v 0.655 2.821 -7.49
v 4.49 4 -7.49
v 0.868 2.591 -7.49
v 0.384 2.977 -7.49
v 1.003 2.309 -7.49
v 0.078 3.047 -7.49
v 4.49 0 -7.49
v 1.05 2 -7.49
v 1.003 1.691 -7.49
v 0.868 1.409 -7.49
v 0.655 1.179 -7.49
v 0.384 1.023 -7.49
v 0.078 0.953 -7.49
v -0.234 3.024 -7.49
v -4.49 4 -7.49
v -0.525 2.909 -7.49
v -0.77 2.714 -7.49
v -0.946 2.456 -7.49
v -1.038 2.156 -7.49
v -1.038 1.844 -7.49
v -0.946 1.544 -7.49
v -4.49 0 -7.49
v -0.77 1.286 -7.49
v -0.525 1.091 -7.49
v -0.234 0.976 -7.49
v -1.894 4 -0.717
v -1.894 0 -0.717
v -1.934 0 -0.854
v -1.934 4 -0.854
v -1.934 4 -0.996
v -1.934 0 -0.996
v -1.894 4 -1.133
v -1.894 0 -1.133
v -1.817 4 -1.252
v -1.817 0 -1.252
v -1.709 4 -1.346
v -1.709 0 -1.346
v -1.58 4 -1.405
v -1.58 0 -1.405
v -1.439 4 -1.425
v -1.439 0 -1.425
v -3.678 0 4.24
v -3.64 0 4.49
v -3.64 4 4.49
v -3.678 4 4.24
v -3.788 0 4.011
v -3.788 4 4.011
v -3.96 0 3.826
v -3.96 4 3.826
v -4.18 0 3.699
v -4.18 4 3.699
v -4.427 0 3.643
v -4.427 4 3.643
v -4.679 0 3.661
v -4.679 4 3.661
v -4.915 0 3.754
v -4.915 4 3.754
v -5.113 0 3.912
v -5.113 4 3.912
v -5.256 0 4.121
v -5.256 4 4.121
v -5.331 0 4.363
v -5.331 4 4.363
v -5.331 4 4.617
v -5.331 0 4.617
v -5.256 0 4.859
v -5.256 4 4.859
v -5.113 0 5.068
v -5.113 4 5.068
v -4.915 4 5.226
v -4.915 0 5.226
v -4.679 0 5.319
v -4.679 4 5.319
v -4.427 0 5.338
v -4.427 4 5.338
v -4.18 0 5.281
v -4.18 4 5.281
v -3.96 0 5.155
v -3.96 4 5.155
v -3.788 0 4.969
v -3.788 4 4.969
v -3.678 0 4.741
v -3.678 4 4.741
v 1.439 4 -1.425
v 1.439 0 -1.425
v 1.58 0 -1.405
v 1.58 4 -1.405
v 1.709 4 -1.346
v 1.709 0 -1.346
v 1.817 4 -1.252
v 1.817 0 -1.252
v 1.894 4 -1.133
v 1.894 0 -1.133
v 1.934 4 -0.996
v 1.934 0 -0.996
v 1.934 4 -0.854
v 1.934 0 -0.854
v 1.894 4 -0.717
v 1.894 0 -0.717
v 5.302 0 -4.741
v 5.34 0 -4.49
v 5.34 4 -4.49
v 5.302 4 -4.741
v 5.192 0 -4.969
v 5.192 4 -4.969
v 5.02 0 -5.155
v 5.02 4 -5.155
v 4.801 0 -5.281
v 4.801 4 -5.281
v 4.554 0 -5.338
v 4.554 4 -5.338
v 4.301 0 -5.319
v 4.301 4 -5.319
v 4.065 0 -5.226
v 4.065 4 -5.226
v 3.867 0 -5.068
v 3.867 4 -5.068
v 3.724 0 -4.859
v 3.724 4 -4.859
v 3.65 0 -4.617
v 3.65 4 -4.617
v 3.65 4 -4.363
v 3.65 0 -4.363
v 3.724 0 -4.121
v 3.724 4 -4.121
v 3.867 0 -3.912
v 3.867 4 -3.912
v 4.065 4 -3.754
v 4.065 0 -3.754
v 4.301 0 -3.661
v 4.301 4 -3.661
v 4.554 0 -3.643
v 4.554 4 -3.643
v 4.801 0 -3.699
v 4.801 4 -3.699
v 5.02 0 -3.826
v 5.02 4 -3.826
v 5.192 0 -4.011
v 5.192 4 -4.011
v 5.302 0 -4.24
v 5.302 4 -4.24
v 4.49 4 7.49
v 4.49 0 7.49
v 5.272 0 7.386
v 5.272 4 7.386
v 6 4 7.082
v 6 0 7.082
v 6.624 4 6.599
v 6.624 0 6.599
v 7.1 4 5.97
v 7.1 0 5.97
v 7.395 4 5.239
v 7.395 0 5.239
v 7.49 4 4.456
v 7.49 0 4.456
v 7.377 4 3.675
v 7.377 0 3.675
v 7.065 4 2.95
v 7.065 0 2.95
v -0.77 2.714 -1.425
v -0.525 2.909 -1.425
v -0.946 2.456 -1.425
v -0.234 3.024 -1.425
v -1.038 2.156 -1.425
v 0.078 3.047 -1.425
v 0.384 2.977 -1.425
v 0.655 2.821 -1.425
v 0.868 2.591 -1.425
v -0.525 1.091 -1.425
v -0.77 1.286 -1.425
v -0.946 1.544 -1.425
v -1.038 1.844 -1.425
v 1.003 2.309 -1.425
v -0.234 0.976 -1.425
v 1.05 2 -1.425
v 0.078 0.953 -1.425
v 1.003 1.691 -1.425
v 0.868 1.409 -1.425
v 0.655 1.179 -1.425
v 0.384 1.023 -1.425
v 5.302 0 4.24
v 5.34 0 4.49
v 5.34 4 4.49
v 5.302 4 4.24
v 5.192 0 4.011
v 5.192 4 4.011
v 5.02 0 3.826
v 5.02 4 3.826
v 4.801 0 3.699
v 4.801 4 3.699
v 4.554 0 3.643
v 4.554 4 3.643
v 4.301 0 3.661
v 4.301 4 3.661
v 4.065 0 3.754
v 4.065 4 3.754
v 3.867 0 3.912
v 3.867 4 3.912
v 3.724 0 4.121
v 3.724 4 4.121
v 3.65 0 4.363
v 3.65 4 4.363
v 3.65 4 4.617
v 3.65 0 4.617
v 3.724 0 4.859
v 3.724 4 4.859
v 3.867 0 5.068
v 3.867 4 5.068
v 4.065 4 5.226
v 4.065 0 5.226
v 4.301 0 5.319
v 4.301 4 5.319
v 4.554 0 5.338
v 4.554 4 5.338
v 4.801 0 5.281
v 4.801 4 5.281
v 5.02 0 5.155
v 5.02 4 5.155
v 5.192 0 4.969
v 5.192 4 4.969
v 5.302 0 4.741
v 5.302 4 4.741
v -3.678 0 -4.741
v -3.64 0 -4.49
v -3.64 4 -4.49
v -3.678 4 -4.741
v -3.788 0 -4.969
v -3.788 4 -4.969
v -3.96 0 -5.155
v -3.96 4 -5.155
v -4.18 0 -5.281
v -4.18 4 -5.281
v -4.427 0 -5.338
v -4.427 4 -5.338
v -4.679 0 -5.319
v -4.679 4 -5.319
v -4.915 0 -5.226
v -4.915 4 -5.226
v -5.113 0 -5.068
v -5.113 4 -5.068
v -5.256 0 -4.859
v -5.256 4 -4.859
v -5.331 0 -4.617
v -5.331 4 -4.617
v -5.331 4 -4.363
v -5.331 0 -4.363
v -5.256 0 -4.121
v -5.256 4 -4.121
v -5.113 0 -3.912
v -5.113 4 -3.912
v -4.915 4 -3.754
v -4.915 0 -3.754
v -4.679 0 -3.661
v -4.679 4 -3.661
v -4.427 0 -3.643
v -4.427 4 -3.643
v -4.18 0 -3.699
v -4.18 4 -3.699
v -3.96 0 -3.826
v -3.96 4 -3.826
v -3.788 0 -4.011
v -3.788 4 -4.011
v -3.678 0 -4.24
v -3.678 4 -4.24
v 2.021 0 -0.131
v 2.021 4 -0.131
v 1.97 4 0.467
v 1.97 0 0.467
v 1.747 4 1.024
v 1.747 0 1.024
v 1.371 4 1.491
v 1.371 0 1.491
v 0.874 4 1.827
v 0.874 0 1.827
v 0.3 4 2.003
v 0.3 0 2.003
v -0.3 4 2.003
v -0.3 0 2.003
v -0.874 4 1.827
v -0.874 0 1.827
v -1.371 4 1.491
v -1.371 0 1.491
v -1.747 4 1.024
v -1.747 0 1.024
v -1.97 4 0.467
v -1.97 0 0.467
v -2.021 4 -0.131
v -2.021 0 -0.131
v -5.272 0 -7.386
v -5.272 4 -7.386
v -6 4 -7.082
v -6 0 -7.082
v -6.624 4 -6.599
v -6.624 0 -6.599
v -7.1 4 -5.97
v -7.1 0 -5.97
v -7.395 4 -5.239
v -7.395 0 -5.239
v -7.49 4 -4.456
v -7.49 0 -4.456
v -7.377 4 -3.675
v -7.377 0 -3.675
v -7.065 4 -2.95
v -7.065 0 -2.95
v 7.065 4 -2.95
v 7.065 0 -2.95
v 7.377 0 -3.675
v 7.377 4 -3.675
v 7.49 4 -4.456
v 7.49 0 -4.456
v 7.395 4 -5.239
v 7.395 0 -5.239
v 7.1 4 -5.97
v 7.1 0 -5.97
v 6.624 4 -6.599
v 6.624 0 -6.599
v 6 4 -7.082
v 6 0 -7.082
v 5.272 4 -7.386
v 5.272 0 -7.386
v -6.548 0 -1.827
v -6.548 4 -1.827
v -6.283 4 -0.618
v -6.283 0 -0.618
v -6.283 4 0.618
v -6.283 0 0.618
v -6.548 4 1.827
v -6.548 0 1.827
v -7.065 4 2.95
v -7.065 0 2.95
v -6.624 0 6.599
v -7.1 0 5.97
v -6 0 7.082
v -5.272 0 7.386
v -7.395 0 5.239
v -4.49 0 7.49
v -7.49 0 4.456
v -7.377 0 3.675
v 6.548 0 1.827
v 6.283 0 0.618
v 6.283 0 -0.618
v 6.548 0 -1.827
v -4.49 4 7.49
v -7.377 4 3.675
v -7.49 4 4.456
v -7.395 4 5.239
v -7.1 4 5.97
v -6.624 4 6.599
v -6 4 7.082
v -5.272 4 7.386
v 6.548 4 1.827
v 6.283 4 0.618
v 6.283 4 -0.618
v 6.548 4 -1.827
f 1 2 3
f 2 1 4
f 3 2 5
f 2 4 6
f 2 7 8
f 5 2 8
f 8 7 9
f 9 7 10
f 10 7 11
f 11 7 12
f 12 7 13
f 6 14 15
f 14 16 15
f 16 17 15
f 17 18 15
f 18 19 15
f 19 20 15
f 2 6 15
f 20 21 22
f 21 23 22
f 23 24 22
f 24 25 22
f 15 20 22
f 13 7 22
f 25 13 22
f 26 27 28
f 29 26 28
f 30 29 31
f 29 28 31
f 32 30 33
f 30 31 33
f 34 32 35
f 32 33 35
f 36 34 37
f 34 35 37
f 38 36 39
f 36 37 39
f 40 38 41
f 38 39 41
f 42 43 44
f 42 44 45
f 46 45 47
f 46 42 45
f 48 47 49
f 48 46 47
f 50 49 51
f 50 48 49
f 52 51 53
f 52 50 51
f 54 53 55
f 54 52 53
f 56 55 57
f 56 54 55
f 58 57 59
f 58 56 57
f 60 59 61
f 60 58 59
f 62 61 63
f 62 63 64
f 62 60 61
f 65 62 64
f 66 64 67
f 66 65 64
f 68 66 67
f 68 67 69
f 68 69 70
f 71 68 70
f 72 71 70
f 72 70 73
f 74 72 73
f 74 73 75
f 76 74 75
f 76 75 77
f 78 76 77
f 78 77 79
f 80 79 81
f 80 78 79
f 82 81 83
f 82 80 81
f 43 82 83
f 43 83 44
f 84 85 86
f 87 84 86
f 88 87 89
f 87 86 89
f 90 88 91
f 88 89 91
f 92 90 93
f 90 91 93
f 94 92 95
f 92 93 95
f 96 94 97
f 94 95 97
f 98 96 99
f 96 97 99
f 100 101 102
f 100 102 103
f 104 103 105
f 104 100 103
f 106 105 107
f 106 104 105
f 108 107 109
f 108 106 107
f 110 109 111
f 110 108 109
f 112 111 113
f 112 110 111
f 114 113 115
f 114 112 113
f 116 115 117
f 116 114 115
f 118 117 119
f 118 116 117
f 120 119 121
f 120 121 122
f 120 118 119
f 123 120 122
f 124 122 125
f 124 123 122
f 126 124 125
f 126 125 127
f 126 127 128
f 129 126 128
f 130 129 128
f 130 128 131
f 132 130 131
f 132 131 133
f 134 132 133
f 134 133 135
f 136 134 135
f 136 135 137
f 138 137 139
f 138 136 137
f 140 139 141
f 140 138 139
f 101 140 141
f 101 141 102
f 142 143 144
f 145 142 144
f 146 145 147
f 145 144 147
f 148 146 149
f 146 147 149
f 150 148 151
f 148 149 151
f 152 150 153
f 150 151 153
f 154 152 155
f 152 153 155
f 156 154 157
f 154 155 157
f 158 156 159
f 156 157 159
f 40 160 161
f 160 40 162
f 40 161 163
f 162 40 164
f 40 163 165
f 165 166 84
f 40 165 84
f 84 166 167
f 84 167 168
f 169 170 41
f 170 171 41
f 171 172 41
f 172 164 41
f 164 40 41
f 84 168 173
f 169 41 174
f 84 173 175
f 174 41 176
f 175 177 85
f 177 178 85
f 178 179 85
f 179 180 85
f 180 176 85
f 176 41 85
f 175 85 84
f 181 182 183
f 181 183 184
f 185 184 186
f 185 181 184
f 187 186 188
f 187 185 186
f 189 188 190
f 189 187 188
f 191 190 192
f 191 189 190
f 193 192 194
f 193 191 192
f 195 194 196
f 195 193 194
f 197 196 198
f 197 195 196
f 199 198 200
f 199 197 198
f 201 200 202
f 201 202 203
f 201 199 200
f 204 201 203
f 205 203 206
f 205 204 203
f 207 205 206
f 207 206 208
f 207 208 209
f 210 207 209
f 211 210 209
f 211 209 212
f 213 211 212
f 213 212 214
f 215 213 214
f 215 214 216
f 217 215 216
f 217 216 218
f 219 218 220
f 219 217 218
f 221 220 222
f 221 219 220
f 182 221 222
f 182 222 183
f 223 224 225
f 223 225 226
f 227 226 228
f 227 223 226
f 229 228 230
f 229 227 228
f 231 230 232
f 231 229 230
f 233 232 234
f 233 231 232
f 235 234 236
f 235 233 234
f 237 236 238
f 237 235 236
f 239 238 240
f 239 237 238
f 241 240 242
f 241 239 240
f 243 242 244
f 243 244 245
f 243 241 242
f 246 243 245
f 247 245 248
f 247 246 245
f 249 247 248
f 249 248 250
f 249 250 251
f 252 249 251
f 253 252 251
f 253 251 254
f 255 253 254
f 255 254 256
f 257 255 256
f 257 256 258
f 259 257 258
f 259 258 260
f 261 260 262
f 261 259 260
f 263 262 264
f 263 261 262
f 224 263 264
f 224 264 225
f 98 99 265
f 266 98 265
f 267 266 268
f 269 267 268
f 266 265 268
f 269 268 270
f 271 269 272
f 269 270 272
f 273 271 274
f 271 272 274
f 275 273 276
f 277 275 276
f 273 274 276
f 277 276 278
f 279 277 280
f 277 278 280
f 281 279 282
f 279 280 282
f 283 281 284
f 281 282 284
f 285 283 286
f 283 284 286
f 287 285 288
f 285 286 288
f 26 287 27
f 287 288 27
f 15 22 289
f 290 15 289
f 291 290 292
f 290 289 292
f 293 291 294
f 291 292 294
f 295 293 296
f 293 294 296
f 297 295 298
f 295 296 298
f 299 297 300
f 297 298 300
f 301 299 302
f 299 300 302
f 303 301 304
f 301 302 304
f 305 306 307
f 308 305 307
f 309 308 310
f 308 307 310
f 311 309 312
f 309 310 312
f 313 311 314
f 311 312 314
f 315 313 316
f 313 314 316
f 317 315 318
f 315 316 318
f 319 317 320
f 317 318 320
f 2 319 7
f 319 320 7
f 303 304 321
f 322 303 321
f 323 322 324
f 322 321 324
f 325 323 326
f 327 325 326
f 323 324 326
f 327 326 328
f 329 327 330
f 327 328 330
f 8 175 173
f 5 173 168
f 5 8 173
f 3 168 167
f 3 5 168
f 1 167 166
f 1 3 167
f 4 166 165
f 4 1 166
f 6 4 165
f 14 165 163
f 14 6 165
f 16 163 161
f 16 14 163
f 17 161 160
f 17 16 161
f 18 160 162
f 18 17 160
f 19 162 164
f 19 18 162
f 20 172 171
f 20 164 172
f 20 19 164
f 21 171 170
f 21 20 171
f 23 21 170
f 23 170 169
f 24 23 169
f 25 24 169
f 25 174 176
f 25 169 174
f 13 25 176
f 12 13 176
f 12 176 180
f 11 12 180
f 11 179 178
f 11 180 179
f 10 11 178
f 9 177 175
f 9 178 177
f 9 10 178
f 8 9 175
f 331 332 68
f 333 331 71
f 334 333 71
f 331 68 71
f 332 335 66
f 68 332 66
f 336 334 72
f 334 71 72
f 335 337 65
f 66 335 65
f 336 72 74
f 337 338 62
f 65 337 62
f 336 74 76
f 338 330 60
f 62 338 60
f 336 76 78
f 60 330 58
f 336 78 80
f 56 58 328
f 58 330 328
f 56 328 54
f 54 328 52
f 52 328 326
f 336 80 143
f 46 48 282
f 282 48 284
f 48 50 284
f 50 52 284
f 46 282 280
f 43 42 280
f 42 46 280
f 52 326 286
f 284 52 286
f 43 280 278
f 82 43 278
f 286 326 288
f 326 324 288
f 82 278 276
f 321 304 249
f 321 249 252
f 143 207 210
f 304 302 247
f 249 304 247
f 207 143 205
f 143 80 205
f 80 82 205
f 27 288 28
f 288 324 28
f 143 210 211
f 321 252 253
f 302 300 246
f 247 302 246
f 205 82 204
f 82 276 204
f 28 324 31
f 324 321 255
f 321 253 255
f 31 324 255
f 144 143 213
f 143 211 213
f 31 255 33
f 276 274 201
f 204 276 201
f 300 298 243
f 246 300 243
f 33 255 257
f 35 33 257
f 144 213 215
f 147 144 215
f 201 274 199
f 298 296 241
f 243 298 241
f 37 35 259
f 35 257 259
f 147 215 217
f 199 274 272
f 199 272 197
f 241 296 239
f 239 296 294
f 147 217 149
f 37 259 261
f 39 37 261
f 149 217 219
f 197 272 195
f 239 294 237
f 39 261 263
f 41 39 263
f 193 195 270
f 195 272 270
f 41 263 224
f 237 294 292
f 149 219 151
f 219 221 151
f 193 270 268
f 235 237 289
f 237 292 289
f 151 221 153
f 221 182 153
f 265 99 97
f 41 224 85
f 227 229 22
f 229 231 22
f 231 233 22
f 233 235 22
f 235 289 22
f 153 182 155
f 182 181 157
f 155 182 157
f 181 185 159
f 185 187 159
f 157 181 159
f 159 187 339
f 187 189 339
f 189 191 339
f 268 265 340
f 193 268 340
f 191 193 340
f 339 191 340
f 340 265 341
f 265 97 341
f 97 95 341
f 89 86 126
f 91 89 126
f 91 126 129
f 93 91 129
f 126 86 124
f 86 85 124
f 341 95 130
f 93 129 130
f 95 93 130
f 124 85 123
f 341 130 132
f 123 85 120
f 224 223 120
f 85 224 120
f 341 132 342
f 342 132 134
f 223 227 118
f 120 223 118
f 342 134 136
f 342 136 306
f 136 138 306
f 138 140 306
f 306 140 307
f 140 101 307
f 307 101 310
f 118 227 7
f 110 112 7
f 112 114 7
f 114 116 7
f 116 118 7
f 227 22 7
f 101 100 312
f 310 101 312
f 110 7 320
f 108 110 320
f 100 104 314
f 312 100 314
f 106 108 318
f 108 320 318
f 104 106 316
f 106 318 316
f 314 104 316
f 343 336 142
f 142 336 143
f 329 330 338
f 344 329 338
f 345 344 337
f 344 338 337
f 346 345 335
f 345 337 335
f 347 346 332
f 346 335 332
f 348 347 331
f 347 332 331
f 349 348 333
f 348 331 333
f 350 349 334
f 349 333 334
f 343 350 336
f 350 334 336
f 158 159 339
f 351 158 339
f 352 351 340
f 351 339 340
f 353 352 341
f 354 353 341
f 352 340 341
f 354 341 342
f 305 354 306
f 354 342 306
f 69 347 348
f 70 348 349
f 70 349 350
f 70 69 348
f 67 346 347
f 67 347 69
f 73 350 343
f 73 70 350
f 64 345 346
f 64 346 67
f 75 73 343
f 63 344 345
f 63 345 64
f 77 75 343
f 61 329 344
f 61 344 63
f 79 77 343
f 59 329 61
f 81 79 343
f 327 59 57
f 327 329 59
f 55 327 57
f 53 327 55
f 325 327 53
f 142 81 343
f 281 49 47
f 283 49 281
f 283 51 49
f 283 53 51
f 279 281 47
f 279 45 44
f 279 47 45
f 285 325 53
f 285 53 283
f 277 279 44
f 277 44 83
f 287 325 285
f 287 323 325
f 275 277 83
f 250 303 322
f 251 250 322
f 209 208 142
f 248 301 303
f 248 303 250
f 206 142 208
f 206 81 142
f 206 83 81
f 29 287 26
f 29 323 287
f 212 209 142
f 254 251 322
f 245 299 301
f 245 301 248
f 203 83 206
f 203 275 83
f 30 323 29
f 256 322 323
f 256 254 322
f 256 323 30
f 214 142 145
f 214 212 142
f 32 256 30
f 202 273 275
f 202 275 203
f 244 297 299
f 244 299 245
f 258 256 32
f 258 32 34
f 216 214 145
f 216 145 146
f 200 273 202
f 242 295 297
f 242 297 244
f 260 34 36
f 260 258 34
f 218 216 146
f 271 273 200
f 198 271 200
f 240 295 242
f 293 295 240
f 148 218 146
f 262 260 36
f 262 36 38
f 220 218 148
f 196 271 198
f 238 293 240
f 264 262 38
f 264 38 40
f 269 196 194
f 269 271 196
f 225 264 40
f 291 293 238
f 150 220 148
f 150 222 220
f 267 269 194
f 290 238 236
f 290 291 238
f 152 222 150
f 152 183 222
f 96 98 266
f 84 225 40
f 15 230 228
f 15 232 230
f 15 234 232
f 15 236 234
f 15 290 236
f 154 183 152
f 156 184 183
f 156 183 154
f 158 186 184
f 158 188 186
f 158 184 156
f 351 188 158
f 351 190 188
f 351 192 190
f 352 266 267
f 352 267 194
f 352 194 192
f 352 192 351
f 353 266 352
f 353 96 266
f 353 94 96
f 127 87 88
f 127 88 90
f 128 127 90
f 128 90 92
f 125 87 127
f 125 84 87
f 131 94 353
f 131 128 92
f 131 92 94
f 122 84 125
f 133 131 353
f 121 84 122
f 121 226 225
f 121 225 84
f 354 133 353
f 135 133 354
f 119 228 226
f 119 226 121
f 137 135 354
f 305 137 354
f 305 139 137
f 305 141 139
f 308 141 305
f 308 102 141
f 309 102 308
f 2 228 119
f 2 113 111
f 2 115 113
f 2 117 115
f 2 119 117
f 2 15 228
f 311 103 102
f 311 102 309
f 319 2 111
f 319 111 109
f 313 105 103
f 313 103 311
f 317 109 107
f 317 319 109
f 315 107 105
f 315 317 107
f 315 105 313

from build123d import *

# Parameters (mm, degrees)
SKETCH1_R                 = 0.85
BASE_SHAPE_DEPTH          = 4
M2_5_GRUB_SCREW_CUT_REACH = 16.98
SKETCH3_R                 = 1.05


with BuildPart() as part:
    # Sketch1 → Base shape (new body)
    with BuildSketch(Plane(origin=(0, 0, 0), x_dir=(1, 0, 0), z_dir=(0, 1, 0))):
        with BuildLine():
            Line((4.490128061, 7.490128061), (-4.490128061, 7.490128061))
            ThreePointArc((-4.490128061, 7.490128061), (-7.099636787, 5.970149752), (-7.064881074, 2.950437533))
            ThreePointArc((-7.064881074, 2.950437533), (-6.25, 0), (-7.064881074, -2.950437533))
            ThreePointArc((-7.064881074, -2.950437533), (-7.099636787, -5.970149752), (-4.490128061, -7.490128061))
            Line((-4.490128061, -7.490128061), (4.490128061, -7.490128061))
            ThreePointArc((4.490128061, -7.490128061), (7.099636787, -5.970149752), (7.064881074, -2.950437533))
            ThreePointArc((7.064881074, -2.950437533), (6.25, 0), (7.064881074, 2.950437533))
            ThreePointArc((7.064881074, 2.950437533), (7.099636787, 5.970149752), (4.490128061, 7.490128061))
        make_face()
        with BuildLine():
            Line((-1.438749457, 1.425), (1.438749457, 1.425))
            ThreePointArc((1.438749457, 1.425), (1.859326776, 1.195397336), (1.893641402, 0.717458876))
            ThreePointArc((1.893641402, 0.717458876), (0, -2.025), (-1.893641402, 0.717458876))
            ThreePointArc((-1.893641402, 0.717458876), (-1.859326776, 1.195397336), (-1.438749457, 1.425))
        make_face(mode=Mode.SUBTRACT)
        with Locations((-4.490128061, 4.490128061)):
            Circle(SKETCH1_R, mode=Mode.SUBTRACT)
        with Locations((4.490128061, 4.490128061)):
            Circle(SKETCH1_R, mode=Mode.SUBTRACT)
        with Locations((-4.490128061, -4.490128061)):
            Circle(SKETCH1_R, mode=Mode.SUBTRACT)
        with Locations((4.490128061, -4.490128061)):
            Circle(SKETCH1_R, mode=Mode.SUBTRACT)
    extrude(amount=BASE_SHAPE_DEPTH)

    # Sketch3 → M2.5 Grub screw cut (cut, up to next)
    with BuildSketch(Plane.XY.offset(-7.490128061), mode=Mode.PRIVATE) as m2_5_grub_screw_cut_sk1:
        with Locations((0, 2)):
            Circle(SKETCH3_R)
    m2_5_grub_screw_cut_tool1 = extrude(m2_5_grub_screw_cut_sk1.sketch, amount=M2_5_GRUB_SCREW_CUT_REACH, mode=Mode.PRIVATE) & part.part
    add(m2_5_grub_screw_cut_tool1.solids().sort_by_distance((0, 2, -7.490128))[0], mode=Mode.SUBTRACT)


solid = part.part
